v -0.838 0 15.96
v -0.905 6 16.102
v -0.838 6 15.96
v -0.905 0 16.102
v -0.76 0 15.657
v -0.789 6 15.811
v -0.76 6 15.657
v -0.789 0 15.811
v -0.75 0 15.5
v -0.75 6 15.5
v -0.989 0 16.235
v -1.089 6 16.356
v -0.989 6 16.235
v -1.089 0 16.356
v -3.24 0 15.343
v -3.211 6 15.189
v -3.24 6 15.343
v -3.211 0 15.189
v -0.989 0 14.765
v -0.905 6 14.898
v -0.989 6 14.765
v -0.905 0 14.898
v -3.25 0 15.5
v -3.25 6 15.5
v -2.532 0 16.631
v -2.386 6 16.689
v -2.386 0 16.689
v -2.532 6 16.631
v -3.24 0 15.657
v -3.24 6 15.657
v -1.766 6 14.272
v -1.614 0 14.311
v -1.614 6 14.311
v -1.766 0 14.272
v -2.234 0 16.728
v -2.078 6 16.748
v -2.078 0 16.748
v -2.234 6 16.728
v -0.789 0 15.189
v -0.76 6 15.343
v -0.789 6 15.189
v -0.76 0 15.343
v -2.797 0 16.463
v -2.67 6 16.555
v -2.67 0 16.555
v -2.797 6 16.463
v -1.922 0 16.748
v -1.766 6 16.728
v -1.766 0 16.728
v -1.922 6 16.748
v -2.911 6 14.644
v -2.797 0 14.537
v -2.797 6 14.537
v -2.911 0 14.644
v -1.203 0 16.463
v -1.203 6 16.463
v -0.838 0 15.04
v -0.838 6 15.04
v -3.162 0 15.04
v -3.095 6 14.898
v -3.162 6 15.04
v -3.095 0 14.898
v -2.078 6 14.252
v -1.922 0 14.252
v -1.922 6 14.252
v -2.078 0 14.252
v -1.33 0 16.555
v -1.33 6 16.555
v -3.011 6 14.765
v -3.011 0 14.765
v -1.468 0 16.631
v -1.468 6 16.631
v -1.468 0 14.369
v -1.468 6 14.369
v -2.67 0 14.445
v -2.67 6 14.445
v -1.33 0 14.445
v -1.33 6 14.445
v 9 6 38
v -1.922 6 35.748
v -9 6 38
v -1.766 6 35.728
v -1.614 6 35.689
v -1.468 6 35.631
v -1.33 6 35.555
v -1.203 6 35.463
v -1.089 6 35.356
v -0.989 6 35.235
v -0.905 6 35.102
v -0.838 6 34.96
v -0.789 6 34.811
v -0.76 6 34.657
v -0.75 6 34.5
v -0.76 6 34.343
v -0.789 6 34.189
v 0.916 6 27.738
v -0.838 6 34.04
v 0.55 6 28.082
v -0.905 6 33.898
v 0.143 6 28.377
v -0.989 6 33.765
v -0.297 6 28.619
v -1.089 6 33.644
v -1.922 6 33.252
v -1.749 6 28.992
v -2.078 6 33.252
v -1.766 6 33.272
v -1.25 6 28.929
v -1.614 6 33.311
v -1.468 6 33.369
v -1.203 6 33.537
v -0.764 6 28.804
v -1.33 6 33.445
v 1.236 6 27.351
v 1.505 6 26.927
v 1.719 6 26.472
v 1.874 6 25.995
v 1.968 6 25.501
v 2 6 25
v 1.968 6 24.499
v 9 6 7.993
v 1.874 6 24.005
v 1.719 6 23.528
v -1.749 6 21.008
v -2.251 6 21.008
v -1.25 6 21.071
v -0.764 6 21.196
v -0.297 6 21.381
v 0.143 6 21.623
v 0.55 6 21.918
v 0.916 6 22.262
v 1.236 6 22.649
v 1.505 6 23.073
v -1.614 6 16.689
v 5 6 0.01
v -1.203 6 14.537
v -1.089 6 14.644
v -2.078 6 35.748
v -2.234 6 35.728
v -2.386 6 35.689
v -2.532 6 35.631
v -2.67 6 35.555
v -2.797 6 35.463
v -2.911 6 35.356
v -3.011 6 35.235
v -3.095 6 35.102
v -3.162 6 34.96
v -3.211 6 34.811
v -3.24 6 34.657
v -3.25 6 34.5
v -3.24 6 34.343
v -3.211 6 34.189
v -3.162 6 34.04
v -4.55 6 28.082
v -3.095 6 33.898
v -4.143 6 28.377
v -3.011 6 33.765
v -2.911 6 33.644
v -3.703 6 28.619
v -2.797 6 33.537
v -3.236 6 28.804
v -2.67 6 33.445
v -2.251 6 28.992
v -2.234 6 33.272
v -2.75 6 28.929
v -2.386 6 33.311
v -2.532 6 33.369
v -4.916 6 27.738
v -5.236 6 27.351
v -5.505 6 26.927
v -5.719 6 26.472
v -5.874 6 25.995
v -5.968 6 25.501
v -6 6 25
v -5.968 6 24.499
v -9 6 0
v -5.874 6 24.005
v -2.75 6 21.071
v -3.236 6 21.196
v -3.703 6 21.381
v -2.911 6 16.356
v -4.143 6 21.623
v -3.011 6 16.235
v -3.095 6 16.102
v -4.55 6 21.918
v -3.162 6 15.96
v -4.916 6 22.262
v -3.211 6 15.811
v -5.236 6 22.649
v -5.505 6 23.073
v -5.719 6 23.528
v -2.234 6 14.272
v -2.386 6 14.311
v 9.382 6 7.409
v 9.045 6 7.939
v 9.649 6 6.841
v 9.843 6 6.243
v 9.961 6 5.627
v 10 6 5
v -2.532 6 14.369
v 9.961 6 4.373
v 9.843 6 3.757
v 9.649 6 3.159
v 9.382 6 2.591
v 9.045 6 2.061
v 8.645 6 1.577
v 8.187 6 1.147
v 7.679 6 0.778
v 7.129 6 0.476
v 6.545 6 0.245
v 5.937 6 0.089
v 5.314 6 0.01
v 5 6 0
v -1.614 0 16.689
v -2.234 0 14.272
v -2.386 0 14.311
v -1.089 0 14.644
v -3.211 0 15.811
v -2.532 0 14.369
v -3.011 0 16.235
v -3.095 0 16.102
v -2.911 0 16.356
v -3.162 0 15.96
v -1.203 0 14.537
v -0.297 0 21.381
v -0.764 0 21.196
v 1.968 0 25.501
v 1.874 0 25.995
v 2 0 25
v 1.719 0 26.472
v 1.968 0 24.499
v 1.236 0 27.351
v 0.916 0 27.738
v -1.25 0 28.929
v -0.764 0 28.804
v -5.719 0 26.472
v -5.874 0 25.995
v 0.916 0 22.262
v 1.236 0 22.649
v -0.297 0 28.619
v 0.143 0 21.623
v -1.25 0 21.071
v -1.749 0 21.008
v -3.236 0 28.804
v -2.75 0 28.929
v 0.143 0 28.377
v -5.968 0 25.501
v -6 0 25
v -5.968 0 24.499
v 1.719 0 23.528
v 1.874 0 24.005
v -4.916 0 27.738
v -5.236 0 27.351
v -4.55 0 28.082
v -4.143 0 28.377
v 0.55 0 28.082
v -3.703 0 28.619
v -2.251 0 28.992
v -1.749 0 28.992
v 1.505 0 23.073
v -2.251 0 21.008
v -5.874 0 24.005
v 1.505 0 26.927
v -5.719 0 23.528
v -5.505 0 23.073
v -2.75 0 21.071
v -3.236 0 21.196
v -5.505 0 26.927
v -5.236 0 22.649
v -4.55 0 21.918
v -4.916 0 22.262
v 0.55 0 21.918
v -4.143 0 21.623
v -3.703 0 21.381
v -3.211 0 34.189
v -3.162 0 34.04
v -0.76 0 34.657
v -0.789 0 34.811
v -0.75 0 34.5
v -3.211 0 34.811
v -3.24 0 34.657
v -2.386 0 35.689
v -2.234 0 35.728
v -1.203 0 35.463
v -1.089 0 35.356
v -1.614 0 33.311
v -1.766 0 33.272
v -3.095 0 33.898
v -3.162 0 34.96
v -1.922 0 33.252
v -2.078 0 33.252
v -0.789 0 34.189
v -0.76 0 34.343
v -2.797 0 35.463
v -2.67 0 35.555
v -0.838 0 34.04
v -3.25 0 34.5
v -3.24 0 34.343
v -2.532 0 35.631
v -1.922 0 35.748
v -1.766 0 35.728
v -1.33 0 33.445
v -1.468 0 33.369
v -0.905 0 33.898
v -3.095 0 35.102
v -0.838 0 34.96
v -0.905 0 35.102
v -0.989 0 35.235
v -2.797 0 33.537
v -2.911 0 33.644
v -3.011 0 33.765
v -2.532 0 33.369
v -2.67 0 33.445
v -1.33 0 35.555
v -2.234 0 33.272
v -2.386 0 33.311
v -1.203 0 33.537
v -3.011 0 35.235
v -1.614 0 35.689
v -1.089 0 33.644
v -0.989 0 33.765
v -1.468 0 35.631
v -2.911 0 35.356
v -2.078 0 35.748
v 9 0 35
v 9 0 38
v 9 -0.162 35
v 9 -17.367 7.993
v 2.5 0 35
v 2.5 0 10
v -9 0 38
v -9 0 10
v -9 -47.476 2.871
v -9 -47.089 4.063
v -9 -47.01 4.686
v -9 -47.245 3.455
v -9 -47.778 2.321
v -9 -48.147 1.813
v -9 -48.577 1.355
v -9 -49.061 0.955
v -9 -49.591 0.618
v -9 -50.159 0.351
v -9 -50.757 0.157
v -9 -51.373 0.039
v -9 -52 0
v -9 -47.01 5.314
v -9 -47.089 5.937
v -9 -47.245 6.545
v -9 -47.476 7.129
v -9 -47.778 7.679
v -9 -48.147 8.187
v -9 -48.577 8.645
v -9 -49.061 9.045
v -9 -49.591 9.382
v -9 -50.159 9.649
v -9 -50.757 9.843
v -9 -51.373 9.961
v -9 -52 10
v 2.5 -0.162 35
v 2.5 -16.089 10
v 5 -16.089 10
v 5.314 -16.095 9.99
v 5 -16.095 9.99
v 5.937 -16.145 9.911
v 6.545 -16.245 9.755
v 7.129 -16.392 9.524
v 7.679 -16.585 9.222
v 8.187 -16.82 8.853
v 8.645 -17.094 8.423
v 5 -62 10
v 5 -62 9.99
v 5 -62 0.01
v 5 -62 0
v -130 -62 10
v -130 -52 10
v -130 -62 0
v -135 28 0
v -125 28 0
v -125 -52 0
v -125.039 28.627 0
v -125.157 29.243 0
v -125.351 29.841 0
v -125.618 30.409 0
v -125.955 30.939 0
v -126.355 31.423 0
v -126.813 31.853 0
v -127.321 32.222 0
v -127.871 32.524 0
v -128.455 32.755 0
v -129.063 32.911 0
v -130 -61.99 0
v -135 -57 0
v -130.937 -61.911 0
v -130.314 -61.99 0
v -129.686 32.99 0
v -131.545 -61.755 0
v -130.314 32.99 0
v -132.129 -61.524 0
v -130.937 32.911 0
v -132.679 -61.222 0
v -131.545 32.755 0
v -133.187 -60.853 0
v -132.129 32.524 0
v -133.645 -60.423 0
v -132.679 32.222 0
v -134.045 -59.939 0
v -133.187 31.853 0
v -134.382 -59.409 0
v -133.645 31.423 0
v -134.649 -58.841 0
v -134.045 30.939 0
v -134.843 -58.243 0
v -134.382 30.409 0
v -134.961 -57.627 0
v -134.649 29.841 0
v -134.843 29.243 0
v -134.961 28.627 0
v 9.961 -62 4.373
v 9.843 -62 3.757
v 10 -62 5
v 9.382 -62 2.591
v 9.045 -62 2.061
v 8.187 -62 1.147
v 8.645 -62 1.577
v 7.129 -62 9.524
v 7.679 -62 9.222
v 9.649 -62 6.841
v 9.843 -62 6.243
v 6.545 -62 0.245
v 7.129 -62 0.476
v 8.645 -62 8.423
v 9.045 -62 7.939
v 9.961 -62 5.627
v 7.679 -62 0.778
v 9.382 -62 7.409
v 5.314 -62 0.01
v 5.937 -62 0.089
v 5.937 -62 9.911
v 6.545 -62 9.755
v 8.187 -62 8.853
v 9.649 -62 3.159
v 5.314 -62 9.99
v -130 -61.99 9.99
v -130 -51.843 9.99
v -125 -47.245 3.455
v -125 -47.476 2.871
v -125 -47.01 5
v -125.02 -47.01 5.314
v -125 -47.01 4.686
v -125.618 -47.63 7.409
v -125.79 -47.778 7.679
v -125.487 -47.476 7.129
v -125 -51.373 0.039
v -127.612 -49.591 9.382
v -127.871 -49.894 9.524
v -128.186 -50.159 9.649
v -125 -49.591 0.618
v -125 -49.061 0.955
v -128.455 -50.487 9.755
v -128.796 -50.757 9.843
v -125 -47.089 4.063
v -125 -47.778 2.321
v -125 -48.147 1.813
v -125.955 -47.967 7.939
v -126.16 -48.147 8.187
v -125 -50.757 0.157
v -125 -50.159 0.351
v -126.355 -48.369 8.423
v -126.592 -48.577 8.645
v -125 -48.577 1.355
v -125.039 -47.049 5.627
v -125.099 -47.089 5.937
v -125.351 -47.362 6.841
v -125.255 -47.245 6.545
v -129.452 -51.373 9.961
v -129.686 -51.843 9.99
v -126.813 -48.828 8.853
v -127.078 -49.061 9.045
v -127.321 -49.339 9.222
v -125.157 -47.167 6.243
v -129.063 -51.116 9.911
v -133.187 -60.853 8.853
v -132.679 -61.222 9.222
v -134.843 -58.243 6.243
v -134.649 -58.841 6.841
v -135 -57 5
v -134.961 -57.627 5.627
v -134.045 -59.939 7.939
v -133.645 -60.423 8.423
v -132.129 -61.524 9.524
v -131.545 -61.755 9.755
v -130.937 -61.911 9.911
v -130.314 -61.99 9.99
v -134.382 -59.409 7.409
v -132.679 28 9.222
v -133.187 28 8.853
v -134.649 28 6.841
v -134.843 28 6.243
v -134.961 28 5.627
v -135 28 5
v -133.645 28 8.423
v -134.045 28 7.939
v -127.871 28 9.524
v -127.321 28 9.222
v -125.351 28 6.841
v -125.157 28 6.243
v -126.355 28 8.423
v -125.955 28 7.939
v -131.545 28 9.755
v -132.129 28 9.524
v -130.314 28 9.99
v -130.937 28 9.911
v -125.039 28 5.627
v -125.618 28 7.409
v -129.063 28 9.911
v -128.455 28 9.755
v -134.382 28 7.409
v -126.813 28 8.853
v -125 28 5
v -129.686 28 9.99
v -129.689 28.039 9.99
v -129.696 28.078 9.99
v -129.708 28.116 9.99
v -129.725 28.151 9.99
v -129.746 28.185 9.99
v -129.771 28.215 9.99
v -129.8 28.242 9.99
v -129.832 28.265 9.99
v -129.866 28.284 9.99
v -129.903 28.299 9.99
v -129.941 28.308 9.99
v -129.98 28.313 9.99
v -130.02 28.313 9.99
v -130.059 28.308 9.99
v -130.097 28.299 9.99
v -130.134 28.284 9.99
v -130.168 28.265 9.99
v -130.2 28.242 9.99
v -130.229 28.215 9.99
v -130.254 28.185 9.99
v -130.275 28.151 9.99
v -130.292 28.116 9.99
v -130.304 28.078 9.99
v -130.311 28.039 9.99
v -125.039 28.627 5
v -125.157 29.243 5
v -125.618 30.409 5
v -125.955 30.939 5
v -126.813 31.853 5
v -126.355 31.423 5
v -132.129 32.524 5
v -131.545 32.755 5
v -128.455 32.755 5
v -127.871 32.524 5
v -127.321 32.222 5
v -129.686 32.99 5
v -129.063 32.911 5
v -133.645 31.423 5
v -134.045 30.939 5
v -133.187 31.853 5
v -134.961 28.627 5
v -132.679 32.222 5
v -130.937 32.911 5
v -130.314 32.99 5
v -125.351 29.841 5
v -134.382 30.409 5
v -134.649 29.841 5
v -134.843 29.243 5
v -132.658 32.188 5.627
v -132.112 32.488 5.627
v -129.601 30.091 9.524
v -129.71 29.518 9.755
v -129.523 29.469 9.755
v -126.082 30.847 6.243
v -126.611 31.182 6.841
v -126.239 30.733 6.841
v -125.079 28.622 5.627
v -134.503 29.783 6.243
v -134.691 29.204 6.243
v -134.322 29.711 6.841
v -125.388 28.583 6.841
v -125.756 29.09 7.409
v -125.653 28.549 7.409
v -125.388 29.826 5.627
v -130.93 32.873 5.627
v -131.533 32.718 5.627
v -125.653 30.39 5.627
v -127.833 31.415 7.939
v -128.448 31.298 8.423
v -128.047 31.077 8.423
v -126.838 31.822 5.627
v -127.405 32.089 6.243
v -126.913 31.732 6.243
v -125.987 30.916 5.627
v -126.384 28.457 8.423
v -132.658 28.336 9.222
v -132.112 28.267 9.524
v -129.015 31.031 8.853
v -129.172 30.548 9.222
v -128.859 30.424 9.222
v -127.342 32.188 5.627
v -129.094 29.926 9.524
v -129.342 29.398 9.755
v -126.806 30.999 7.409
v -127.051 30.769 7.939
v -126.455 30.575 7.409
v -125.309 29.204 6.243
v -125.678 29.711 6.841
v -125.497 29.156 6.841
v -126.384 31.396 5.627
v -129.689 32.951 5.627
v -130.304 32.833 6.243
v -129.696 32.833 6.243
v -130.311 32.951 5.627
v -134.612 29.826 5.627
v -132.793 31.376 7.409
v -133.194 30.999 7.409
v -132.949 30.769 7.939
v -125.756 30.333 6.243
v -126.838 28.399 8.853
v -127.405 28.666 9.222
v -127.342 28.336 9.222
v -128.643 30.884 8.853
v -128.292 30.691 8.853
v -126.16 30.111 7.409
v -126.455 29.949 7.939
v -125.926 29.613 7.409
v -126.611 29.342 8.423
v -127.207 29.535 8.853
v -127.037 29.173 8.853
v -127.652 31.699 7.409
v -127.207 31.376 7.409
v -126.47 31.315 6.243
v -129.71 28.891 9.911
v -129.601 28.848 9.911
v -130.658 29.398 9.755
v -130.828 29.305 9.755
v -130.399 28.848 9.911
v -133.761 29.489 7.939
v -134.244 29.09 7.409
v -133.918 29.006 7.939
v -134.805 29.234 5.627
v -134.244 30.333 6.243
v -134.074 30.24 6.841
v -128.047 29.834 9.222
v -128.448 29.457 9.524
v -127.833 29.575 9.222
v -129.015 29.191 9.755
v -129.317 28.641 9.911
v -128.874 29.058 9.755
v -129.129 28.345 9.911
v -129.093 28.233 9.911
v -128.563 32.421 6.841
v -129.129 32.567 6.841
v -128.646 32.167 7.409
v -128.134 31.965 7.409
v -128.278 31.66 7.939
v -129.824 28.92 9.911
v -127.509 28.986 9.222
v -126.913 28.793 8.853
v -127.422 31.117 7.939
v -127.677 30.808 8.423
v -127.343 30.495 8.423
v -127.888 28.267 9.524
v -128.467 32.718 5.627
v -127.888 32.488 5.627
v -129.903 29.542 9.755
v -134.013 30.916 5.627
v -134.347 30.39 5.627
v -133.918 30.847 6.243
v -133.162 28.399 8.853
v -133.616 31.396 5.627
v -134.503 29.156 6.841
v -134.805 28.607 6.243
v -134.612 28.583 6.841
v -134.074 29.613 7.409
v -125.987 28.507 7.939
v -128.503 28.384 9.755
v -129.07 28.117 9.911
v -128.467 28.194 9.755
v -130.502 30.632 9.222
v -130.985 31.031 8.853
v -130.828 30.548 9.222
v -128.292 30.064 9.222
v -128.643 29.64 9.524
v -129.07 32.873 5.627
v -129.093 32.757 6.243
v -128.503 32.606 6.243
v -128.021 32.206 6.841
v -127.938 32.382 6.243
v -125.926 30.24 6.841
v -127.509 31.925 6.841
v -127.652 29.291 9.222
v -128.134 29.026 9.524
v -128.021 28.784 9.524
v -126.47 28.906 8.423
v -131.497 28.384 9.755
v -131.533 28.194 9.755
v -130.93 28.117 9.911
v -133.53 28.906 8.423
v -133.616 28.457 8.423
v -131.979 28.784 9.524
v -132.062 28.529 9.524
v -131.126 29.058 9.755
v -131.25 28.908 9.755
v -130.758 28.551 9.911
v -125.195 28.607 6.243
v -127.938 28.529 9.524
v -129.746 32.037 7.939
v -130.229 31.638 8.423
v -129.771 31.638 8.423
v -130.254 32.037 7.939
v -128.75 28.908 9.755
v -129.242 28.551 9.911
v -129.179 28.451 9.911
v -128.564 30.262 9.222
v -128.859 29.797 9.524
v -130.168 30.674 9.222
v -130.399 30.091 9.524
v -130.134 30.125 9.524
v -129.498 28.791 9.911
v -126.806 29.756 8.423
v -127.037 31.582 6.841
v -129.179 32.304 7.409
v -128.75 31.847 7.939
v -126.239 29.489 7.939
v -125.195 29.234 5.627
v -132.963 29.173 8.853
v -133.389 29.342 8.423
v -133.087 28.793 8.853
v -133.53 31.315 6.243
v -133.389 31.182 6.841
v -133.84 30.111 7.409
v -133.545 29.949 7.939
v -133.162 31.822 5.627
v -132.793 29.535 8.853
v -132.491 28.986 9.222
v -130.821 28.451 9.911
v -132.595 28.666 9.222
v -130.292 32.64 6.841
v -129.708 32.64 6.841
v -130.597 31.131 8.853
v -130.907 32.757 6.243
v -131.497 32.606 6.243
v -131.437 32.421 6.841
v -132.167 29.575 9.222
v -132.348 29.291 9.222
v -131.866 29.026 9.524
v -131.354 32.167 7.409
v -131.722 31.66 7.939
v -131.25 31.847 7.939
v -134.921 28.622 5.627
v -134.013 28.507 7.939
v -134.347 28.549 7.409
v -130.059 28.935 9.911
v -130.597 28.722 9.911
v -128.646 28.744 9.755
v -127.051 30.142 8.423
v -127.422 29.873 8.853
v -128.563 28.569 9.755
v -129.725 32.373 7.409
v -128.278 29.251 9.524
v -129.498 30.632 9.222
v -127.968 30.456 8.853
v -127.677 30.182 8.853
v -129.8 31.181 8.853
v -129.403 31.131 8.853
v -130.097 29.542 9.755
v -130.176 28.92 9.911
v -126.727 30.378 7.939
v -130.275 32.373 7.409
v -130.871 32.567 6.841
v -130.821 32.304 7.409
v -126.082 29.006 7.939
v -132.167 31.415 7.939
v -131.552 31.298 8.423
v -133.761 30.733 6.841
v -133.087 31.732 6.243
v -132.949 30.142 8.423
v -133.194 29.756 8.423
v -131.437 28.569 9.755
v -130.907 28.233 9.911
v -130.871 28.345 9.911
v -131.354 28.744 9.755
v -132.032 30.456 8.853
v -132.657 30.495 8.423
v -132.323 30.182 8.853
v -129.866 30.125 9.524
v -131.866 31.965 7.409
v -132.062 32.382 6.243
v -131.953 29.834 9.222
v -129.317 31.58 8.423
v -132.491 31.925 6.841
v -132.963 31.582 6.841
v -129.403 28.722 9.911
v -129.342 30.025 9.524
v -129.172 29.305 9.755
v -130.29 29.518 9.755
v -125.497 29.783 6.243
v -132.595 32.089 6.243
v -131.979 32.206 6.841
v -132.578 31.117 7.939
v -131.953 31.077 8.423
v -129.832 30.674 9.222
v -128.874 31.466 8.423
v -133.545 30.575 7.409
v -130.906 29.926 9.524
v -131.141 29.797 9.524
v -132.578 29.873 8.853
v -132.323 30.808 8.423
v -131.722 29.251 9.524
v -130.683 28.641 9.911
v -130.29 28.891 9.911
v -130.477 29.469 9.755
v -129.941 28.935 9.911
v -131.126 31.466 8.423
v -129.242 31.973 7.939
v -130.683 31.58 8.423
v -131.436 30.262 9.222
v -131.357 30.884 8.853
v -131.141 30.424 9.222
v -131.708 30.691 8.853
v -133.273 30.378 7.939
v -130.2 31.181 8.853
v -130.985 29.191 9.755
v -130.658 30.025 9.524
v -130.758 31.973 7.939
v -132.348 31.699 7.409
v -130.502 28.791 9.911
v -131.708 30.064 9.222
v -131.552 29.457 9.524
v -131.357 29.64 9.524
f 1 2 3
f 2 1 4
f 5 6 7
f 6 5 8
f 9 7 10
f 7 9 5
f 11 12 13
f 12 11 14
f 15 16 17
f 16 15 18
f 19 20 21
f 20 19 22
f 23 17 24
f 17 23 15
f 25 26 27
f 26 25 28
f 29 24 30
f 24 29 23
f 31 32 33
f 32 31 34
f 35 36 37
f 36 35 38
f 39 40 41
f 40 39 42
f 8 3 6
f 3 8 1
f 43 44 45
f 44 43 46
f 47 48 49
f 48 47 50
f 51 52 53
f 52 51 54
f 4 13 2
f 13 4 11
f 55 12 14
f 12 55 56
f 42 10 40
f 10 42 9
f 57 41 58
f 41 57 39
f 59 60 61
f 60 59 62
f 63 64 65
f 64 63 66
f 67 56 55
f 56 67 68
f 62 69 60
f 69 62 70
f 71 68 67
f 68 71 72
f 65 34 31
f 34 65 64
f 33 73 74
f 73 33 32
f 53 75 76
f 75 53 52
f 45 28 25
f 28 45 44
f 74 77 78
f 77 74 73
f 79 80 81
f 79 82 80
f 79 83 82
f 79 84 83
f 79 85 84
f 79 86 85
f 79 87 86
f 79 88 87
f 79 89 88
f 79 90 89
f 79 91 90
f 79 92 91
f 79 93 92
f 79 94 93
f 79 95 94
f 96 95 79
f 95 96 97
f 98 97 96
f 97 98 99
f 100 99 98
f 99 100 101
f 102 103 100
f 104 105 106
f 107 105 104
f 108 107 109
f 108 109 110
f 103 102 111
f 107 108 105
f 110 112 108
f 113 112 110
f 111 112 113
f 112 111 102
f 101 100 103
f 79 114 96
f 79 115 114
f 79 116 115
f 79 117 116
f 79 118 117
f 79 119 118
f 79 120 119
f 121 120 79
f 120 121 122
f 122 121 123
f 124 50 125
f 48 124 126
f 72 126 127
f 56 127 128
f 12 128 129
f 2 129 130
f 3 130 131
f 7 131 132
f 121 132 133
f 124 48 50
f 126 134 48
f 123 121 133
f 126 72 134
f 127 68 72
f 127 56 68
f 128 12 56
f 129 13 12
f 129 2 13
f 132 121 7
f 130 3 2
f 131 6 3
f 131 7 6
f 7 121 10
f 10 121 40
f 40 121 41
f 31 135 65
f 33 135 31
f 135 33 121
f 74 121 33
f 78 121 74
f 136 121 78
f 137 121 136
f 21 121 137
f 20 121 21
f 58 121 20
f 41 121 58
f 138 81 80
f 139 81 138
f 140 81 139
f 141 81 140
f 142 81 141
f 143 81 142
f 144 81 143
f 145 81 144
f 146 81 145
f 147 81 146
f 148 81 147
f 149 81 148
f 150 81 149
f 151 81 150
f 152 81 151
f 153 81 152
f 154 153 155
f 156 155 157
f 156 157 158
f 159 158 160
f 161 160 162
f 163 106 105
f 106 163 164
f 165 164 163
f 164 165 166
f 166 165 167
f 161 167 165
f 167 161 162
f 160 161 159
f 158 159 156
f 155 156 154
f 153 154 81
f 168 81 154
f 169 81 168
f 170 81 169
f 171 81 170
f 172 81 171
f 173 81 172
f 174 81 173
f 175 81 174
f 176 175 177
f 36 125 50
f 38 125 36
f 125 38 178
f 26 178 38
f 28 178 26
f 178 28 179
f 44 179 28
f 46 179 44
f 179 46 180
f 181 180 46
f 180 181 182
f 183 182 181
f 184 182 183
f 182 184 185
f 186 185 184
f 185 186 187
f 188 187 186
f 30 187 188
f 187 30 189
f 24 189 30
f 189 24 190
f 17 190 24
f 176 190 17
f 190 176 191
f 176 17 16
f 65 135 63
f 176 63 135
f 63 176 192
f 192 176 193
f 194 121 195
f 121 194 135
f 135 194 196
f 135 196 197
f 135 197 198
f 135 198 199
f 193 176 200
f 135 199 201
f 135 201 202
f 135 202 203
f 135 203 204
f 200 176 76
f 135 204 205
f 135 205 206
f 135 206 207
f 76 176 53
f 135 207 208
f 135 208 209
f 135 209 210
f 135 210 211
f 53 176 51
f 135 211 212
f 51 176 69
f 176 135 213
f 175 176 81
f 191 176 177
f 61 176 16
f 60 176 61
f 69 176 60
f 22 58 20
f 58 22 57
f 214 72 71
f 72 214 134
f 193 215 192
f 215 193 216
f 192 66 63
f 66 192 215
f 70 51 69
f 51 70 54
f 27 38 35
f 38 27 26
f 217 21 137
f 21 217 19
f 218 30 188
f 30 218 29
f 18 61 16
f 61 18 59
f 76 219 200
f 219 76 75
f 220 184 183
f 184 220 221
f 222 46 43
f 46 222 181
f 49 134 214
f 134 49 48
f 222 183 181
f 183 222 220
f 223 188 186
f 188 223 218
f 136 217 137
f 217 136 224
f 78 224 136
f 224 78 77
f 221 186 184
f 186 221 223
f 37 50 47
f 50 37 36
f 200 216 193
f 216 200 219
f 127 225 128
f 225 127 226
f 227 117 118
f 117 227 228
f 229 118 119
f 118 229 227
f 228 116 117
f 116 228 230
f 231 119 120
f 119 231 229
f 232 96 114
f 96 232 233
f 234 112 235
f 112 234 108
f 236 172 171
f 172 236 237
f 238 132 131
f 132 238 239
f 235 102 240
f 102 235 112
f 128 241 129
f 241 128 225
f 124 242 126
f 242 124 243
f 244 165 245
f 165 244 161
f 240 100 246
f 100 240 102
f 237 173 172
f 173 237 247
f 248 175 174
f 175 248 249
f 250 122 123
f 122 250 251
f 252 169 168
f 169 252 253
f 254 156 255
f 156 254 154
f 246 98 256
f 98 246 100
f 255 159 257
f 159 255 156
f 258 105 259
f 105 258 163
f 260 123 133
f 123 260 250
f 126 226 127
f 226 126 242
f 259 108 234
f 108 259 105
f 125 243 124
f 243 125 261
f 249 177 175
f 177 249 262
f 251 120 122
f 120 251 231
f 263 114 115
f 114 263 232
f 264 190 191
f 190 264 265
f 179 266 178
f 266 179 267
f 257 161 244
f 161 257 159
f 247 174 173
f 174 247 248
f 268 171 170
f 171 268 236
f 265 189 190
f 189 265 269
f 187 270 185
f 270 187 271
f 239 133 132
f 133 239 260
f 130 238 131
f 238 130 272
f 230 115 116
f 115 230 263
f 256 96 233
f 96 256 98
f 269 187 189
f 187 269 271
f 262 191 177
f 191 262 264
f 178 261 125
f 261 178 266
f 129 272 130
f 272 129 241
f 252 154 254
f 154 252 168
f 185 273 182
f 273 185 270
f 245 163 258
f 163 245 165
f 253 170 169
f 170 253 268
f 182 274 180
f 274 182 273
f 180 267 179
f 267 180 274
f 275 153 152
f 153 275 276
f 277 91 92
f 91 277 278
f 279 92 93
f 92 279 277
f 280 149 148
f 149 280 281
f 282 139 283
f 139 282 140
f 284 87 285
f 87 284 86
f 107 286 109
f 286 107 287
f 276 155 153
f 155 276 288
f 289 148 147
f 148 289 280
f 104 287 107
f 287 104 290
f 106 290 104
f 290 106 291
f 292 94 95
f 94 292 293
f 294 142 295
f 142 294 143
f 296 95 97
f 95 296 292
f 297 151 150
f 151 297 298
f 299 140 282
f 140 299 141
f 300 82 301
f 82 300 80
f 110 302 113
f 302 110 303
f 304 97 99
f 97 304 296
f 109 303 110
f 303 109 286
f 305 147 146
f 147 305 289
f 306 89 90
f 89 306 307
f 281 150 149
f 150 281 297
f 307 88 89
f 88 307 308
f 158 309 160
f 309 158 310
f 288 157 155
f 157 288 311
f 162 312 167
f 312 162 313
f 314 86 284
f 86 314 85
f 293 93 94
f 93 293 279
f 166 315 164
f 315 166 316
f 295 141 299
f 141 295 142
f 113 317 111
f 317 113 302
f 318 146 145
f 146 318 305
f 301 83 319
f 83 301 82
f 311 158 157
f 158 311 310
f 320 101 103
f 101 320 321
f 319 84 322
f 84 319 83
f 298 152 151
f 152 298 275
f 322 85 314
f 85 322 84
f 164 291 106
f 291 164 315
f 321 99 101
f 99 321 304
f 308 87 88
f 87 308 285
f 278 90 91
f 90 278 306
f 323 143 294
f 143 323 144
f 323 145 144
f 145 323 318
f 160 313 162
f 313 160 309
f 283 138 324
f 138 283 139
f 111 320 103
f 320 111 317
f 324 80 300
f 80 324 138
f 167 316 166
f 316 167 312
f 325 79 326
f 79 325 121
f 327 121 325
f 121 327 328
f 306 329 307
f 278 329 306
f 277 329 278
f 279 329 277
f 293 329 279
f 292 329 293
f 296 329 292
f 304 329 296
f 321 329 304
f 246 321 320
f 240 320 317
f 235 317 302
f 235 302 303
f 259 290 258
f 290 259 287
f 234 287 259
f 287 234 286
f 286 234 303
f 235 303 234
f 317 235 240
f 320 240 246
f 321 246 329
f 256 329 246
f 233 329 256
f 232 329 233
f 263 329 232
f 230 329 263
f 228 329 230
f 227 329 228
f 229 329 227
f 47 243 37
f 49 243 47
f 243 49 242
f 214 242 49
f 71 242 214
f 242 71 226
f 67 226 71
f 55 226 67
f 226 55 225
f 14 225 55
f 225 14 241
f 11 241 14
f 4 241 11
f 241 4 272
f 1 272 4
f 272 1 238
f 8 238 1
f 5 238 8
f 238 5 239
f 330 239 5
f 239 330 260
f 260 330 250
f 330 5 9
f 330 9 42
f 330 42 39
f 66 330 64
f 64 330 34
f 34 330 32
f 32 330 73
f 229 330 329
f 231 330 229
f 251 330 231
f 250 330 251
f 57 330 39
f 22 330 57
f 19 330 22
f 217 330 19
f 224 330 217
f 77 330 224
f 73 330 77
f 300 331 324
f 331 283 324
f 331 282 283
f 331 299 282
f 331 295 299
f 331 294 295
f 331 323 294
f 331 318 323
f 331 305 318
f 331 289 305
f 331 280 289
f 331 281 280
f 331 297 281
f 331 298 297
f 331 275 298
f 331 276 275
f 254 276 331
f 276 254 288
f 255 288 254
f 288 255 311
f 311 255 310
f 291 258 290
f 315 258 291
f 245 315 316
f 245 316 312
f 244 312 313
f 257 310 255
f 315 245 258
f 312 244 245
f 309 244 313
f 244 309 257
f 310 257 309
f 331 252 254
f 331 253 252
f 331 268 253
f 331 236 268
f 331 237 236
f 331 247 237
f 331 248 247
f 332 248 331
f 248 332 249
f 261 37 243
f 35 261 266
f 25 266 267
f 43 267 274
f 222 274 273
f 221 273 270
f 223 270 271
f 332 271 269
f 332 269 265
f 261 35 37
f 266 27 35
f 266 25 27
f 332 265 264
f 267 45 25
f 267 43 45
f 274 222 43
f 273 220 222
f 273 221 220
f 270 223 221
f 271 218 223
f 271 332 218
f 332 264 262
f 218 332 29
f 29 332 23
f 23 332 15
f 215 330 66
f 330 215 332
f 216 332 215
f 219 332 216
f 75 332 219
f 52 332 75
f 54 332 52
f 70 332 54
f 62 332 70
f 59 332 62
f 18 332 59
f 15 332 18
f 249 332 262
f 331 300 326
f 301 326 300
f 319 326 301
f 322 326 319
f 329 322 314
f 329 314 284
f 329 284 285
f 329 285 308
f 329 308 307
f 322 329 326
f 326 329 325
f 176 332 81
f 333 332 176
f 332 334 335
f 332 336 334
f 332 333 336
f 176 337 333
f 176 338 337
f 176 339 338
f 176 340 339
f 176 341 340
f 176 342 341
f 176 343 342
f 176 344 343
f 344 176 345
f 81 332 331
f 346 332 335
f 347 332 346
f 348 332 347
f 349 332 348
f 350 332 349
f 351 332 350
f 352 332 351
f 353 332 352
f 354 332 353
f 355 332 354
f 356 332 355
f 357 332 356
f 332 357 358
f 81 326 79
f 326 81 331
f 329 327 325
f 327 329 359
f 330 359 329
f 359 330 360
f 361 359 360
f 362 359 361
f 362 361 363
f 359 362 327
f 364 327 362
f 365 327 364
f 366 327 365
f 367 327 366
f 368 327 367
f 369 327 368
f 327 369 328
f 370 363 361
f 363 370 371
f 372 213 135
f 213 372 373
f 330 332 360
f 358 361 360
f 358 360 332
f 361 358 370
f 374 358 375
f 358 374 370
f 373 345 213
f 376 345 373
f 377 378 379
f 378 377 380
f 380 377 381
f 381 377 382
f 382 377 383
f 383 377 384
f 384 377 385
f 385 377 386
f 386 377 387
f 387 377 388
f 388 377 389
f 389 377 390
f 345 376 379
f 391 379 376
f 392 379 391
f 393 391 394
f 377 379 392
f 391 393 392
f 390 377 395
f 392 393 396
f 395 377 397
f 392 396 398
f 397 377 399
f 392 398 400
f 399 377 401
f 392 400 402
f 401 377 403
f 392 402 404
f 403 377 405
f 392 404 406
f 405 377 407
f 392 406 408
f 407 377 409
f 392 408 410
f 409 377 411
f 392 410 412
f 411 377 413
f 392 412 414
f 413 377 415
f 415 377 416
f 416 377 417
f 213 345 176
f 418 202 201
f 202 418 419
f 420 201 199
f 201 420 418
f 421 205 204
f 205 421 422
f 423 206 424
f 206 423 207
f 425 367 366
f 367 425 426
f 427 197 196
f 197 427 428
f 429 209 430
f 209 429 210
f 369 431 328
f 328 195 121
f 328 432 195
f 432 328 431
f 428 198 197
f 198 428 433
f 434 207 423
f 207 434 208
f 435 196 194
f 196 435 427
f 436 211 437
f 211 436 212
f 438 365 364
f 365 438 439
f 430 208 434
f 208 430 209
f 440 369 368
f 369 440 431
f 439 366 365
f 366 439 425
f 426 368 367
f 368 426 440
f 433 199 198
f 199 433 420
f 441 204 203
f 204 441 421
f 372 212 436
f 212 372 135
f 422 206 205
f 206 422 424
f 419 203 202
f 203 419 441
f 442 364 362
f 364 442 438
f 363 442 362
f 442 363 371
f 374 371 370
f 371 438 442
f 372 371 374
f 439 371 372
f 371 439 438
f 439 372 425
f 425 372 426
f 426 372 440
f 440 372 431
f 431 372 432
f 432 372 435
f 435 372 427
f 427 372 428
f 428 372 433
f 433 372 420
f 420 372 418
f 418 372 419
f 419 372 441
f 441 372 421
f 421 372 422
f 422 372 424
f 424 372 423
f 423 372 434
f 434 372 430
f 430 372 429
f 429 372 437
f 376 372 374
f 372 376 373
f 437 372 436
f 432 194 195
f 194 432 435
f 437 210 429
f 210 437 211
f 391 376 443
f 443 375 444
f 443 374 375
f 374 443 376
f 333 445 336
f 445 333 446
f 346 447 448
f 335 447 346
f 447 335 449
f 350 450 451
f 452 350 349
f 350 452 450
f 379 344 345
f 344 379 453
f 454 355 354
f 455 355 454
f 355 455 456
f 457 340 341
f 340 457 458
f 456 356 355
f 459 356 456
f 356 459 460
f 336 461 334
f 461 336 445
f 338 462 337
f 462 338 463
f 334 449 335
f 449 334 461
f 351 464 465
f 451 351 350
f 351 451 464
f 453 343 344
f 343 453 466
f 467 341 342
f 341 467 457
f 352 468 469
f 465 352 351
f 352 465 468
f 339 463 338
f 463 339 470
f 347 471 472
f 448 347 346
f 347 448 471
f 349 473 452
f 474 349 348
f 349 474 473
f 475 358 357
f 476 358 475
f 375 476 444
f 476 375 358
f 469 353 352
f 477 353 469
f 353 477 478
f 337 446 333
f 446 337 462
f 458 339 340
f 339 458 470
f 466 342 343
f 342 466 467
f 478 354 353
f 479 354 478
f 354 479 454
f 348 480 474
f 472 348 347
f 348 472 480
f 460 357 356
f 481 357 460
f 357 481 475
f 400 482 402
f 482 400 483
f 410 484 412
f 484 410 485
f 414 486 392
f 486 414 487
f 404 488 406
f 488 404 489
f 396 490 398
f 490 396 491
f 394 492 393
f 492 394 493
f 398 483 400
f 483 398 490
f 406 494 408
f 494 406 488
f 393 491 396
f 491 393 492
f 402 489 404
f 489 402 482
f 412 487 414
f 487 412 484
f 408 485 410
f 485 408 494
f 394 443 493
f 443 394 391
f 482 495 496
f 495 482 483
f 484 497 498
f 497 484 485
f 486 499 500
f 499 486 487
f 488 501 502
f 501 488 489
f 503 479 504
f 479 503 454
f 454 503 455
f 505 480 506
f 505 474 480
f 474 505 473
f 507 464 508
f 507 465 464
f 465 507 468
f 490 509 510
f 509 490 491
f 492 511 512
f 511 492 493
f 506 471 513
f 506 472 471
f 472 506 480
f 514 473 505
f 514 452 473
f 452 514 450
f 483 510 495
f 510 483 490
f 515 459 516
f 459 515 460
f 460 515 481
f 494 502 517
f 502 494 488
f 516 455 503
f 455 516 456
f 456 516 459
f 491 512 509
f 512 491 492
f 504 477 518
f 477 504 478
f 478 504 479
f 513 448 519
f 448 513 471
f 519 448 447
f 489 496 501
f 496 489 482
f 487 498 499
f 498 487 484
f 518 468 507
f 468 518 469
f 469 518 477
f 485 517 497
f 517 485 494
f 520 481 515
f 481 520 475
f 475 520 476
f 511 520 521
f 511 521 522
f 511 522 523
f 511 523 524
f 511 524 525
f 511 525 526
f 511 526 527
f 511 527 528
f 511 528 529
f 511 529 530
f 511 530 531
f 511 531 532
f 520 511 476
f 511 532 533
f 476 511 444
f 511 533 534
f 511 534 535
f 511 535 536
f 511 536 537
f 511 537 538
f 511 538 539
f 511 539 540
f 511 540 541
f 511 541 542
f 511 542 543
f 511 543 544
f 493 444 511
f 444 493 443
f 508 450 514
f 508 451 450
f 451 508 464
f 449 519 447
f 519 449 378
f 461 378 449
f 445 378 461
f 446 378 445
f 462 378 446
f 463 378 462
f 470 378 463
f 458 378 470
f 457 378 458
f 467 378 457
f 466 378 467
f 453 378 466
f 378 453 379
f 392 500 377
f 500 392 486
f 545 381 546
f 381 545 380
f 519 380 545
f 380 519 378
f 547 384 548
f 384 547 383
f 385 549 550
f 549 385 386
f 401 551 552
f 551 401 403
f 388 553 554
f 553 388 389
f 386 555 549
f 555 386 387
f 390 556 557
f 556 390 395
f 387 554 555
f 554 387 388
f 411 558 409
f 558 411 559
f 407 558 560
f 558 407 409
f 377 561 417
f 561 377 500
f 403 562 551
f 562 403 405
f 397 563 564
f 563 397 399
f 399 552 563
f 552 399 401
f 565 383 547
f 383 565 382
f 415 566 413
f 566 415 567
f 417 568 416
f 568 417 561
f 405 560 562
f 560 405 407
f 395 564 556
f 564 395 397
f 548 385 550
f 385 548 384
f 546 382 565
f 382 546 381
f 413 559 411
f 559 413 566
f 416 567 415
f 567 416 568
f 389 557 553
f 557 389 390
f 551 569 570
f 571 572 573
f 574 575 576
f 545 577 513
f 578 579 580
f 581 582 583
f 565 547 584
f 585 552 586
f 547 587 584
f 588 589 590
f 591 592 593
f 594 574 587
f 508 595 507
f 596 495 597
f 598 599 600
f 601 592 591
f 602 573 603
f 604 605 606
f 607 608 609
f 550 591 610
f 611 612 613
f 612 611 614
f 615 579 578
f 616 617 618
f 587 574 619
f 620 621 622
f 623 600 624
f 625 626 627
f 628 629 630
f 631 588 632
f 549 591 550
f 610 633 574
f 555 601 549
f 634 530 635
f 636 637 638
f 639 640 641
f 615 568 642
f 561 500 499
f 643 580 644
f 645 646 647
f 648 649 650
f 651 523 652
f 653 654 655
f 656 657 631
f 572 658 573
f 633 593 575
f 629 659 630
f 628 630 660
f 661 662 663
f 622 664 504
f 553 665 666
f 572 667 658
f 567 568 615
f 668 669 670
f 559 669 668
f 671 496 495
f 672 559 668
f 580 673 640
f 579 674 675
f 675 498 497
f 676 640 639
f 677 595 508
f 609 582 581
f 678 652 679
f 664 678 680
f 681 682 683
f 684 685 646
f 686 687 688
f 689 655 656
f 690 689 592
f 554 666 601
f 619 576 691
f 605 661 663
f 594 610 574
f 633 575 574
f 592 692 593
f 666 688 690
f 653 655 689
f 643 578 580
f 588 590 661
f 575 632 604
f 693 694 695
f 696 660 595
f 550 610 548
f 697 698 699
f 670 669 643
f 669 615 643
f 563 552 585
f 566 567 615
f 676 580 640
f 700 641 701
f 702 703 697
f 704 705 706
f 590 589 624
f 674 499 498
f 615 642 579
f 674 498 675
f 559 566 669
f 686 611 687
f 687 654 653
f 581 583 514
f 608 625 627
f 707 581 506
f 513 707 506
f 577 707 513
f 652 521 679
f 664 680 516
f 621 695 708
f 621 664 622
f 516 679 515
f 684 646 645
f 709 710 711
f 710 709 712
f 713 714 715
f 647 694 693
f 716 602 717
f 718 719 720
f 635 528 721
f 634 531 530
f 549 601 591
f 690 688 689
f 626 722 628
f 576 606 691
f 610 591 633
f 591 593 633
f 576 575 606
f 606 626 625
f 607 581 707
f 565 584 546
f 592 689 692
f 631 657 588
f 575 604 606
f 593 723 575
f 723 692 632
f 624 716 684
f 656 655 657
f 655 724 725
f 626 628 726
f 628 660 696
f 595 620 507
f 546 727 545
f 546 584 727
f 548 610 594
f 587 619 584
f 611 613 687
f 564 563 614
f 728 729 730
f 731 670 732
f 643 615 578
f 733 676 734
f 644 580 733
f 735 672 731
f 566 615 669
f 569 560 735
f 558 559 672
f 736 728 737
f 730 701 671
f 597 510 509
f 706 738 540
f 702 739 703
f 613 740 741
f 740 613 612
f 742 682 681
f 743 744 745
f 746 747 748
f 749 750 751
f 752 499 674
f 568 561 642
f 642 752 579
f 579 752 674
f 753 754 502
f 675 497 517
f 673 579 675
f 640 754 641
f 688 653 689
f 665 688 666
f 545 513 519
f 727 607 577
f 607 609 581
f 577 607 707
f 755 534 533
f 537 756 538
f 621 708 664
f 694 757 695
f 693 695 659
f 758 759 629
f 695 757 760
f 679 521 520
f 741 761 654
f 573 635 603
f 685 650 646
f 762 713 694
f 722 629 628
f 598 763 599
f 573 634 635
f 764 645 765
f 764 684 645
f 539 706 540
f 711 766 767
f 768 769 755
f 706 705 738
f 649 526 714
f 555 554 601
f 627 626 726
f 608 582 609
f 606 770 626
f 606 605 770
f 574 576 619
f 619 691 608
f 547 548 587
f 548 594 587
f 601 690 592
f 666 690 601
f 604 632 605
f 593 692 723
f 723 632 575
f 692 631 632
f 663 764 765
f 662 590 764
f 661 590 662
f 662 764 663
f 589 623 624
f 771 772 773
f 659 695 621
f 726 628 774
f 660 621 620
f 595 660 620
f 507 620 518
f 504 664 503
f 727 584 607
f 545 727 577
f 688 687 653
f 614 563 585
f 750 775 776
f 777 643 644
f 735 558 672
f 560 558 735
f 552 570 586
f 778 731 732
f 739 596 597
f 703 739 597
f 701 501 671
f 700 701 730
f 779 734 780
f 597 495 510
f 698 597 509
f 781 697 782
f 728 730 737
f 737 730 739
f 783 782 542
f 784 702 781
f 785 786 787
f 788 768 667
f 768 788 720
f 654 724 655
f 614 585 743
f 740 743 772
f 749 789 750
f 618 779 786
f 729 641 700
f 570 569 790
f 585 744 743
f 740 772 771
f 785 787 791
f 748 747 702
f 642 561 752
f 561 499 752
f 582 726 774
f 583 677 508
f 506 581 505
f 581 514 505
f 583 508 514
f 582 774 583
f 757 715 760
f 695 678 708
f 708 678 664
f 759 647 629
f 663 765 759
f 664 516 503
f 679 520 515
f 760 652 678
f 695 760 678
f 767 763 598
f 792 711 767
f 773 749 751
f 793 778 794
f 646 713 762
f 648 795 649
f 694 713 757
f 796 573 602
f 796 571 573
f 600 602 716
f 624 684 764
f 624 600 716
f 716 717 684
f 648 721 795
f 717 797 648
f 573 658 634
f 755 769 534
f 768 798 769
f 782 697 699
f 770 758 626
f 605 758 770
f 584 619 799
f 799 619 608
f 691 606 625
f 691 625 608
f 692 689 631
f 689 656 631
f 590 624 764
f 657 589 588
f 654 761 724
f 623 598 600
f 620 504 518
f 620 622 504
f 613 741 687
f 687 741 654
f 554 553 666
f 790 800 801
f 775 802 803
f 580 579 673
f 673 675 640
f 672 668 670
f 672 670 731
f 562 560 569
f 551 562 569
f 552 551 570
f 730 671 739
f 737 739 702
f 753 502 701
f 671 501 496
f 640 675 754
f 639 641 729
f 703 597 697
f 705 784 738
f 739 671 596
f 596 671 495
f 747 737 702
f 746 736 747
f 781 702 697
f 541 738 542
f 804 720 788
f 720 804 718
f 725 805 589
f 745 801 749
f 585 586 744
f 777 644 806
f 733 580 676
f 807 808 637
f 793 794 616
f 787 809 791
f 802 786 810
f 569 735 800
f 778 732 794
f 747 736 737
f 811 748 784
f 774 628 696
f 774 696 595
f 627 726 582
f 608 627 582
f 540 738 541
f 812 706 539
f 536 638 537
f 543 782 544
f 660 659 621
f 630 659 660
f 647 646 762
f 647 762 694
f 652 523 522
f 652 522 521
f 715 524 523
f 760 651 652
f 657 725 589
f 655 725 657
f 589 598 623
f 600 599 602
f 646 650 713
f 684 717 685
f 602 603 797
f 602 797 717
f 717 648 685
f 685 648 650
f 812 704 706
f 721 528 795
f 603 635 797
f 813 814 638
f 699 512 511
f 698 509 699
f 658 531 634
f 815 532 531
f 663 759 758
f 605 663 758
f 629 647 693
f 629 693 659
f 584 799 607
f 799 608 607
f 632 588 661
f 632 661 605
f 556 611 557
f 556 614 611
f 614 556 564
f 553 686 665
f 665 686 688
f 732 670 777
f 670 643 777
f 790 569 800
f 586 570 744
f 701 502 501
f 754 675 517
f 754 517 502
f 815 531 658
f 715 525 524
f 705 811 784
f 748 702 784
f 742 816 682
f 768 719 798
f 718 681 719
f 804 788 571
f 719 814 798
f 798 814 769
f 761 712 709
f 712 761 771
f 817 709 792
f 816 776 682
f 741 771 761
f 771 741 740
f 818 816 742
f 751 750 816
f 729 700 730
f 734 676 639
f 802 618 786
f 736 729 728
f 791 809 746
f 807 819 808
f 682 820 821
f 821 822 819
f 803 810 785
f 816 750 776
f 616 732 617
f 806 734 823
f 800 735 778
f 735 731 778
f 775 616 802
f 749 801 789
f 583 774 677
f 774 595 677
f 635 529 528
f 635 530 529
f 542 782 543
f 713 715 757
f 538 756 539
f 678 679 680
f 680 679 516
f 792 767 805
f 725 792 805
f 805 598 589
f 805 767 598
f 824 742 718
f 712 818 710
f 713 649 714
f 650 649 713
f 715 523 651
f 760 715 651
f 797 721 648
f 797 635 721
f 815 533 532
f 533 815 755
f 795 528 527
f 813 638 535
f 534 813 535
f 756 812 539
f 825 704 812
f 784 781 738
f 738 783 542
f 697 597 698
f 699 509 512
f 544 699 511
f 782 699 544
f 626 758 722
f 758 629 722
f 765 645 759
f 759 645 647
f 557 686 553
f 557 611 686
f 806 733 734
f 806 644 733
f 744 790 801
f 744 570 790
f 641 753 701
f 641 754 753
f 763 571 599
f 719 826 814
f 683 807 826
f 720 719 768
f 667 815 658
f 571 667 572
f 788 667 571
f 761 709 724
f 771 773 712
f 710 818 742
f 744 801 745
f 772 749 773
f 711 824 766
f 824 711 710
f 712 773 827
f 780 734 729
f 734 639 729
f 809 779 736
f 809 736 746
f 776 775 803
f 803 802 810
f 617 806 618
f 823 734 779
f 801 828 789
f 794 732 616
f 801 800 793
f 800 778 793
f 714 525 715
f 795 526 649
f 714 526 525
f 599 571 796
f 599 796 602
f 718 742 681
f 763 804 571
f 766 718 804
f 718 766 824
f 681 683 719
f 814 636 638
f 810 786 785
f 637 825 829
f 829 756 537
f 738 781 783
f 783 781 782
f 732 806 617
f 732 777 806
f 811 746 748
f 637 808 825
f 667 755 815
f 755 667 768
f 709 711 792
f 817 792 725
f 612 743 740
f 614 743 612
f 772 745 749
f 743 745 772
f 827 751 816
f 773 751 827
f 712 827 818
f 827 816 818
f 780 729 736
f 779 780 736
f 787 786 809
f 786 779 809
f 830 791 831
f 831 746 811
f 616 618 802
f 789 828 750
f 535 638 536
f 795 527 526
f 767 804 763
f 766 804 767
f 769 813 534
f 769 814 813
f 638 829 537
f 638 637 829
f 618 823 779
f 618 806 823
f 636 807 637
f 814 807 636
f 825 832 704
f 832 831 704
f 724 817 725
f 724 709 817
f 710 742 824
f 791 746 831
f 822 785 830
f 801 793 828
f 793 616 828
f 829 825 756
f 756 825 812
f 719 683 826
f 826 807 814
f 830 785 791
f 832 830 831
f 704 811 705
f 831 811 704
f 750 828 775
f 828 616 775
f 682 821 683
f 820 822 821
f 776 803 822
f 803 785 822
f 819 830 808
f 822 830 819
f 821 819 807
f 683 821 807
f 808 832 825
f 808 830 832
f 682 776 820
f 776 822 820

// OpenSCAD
$fn=50;
module bras_verres_et_claps() {
translate([-9,6,10])rotate([90,0,0])difference() {
	translate([0,-6,0])cube([18,34,6]);
	
	union() {
		translate([7,5.5,0]) cylinder(20, d=2.5);
		translate([7,15,0]) cylinder(20, d=8);
		translate([7,24.5,0]) cylinder(20, d=2.5);
	}
}
translate([2.5,-18,7]) difference(){cube([6.5,18,28]);
rotate([57.5,0,0])cube([7,100,100]);
}
translate([0,0,0]) {
	translate([-9,-56,0])cube([14,62,10]);
	translate([5,-62,5]) rotate([-90,0,0]) cylinder(68, d=10);	
}

translate([-130,-62,0]) {
	cube([135,10,10]);
	translate([0,10,5]) rotate([0,90,0]) cylinder(135, d=10);
}

translate([-135,-62,0]) {
	translate([0,5,0]) cube([10, 85, 5]);
 	translate([5,5,5]) rotate([-90,0,0]) cylinder(85, d=10);

 	translate([5,90,0]) rotate([0,0,0]) cylinder(5, d=10);
	translate([5,90,5]) sphere(d=10);

 	translate([5,5,0]) rotate([0,0,0]) cylinder(5, d=10);
	intersection() {
 		translate([5,5,0]) rotate([0,0,0]) cylinder(10, d=10);
 		translate([5,0,5]) rotate([-90,0,0]) cylinder(10, d=10);
	}
}
}
bras_verres_et_claps();
